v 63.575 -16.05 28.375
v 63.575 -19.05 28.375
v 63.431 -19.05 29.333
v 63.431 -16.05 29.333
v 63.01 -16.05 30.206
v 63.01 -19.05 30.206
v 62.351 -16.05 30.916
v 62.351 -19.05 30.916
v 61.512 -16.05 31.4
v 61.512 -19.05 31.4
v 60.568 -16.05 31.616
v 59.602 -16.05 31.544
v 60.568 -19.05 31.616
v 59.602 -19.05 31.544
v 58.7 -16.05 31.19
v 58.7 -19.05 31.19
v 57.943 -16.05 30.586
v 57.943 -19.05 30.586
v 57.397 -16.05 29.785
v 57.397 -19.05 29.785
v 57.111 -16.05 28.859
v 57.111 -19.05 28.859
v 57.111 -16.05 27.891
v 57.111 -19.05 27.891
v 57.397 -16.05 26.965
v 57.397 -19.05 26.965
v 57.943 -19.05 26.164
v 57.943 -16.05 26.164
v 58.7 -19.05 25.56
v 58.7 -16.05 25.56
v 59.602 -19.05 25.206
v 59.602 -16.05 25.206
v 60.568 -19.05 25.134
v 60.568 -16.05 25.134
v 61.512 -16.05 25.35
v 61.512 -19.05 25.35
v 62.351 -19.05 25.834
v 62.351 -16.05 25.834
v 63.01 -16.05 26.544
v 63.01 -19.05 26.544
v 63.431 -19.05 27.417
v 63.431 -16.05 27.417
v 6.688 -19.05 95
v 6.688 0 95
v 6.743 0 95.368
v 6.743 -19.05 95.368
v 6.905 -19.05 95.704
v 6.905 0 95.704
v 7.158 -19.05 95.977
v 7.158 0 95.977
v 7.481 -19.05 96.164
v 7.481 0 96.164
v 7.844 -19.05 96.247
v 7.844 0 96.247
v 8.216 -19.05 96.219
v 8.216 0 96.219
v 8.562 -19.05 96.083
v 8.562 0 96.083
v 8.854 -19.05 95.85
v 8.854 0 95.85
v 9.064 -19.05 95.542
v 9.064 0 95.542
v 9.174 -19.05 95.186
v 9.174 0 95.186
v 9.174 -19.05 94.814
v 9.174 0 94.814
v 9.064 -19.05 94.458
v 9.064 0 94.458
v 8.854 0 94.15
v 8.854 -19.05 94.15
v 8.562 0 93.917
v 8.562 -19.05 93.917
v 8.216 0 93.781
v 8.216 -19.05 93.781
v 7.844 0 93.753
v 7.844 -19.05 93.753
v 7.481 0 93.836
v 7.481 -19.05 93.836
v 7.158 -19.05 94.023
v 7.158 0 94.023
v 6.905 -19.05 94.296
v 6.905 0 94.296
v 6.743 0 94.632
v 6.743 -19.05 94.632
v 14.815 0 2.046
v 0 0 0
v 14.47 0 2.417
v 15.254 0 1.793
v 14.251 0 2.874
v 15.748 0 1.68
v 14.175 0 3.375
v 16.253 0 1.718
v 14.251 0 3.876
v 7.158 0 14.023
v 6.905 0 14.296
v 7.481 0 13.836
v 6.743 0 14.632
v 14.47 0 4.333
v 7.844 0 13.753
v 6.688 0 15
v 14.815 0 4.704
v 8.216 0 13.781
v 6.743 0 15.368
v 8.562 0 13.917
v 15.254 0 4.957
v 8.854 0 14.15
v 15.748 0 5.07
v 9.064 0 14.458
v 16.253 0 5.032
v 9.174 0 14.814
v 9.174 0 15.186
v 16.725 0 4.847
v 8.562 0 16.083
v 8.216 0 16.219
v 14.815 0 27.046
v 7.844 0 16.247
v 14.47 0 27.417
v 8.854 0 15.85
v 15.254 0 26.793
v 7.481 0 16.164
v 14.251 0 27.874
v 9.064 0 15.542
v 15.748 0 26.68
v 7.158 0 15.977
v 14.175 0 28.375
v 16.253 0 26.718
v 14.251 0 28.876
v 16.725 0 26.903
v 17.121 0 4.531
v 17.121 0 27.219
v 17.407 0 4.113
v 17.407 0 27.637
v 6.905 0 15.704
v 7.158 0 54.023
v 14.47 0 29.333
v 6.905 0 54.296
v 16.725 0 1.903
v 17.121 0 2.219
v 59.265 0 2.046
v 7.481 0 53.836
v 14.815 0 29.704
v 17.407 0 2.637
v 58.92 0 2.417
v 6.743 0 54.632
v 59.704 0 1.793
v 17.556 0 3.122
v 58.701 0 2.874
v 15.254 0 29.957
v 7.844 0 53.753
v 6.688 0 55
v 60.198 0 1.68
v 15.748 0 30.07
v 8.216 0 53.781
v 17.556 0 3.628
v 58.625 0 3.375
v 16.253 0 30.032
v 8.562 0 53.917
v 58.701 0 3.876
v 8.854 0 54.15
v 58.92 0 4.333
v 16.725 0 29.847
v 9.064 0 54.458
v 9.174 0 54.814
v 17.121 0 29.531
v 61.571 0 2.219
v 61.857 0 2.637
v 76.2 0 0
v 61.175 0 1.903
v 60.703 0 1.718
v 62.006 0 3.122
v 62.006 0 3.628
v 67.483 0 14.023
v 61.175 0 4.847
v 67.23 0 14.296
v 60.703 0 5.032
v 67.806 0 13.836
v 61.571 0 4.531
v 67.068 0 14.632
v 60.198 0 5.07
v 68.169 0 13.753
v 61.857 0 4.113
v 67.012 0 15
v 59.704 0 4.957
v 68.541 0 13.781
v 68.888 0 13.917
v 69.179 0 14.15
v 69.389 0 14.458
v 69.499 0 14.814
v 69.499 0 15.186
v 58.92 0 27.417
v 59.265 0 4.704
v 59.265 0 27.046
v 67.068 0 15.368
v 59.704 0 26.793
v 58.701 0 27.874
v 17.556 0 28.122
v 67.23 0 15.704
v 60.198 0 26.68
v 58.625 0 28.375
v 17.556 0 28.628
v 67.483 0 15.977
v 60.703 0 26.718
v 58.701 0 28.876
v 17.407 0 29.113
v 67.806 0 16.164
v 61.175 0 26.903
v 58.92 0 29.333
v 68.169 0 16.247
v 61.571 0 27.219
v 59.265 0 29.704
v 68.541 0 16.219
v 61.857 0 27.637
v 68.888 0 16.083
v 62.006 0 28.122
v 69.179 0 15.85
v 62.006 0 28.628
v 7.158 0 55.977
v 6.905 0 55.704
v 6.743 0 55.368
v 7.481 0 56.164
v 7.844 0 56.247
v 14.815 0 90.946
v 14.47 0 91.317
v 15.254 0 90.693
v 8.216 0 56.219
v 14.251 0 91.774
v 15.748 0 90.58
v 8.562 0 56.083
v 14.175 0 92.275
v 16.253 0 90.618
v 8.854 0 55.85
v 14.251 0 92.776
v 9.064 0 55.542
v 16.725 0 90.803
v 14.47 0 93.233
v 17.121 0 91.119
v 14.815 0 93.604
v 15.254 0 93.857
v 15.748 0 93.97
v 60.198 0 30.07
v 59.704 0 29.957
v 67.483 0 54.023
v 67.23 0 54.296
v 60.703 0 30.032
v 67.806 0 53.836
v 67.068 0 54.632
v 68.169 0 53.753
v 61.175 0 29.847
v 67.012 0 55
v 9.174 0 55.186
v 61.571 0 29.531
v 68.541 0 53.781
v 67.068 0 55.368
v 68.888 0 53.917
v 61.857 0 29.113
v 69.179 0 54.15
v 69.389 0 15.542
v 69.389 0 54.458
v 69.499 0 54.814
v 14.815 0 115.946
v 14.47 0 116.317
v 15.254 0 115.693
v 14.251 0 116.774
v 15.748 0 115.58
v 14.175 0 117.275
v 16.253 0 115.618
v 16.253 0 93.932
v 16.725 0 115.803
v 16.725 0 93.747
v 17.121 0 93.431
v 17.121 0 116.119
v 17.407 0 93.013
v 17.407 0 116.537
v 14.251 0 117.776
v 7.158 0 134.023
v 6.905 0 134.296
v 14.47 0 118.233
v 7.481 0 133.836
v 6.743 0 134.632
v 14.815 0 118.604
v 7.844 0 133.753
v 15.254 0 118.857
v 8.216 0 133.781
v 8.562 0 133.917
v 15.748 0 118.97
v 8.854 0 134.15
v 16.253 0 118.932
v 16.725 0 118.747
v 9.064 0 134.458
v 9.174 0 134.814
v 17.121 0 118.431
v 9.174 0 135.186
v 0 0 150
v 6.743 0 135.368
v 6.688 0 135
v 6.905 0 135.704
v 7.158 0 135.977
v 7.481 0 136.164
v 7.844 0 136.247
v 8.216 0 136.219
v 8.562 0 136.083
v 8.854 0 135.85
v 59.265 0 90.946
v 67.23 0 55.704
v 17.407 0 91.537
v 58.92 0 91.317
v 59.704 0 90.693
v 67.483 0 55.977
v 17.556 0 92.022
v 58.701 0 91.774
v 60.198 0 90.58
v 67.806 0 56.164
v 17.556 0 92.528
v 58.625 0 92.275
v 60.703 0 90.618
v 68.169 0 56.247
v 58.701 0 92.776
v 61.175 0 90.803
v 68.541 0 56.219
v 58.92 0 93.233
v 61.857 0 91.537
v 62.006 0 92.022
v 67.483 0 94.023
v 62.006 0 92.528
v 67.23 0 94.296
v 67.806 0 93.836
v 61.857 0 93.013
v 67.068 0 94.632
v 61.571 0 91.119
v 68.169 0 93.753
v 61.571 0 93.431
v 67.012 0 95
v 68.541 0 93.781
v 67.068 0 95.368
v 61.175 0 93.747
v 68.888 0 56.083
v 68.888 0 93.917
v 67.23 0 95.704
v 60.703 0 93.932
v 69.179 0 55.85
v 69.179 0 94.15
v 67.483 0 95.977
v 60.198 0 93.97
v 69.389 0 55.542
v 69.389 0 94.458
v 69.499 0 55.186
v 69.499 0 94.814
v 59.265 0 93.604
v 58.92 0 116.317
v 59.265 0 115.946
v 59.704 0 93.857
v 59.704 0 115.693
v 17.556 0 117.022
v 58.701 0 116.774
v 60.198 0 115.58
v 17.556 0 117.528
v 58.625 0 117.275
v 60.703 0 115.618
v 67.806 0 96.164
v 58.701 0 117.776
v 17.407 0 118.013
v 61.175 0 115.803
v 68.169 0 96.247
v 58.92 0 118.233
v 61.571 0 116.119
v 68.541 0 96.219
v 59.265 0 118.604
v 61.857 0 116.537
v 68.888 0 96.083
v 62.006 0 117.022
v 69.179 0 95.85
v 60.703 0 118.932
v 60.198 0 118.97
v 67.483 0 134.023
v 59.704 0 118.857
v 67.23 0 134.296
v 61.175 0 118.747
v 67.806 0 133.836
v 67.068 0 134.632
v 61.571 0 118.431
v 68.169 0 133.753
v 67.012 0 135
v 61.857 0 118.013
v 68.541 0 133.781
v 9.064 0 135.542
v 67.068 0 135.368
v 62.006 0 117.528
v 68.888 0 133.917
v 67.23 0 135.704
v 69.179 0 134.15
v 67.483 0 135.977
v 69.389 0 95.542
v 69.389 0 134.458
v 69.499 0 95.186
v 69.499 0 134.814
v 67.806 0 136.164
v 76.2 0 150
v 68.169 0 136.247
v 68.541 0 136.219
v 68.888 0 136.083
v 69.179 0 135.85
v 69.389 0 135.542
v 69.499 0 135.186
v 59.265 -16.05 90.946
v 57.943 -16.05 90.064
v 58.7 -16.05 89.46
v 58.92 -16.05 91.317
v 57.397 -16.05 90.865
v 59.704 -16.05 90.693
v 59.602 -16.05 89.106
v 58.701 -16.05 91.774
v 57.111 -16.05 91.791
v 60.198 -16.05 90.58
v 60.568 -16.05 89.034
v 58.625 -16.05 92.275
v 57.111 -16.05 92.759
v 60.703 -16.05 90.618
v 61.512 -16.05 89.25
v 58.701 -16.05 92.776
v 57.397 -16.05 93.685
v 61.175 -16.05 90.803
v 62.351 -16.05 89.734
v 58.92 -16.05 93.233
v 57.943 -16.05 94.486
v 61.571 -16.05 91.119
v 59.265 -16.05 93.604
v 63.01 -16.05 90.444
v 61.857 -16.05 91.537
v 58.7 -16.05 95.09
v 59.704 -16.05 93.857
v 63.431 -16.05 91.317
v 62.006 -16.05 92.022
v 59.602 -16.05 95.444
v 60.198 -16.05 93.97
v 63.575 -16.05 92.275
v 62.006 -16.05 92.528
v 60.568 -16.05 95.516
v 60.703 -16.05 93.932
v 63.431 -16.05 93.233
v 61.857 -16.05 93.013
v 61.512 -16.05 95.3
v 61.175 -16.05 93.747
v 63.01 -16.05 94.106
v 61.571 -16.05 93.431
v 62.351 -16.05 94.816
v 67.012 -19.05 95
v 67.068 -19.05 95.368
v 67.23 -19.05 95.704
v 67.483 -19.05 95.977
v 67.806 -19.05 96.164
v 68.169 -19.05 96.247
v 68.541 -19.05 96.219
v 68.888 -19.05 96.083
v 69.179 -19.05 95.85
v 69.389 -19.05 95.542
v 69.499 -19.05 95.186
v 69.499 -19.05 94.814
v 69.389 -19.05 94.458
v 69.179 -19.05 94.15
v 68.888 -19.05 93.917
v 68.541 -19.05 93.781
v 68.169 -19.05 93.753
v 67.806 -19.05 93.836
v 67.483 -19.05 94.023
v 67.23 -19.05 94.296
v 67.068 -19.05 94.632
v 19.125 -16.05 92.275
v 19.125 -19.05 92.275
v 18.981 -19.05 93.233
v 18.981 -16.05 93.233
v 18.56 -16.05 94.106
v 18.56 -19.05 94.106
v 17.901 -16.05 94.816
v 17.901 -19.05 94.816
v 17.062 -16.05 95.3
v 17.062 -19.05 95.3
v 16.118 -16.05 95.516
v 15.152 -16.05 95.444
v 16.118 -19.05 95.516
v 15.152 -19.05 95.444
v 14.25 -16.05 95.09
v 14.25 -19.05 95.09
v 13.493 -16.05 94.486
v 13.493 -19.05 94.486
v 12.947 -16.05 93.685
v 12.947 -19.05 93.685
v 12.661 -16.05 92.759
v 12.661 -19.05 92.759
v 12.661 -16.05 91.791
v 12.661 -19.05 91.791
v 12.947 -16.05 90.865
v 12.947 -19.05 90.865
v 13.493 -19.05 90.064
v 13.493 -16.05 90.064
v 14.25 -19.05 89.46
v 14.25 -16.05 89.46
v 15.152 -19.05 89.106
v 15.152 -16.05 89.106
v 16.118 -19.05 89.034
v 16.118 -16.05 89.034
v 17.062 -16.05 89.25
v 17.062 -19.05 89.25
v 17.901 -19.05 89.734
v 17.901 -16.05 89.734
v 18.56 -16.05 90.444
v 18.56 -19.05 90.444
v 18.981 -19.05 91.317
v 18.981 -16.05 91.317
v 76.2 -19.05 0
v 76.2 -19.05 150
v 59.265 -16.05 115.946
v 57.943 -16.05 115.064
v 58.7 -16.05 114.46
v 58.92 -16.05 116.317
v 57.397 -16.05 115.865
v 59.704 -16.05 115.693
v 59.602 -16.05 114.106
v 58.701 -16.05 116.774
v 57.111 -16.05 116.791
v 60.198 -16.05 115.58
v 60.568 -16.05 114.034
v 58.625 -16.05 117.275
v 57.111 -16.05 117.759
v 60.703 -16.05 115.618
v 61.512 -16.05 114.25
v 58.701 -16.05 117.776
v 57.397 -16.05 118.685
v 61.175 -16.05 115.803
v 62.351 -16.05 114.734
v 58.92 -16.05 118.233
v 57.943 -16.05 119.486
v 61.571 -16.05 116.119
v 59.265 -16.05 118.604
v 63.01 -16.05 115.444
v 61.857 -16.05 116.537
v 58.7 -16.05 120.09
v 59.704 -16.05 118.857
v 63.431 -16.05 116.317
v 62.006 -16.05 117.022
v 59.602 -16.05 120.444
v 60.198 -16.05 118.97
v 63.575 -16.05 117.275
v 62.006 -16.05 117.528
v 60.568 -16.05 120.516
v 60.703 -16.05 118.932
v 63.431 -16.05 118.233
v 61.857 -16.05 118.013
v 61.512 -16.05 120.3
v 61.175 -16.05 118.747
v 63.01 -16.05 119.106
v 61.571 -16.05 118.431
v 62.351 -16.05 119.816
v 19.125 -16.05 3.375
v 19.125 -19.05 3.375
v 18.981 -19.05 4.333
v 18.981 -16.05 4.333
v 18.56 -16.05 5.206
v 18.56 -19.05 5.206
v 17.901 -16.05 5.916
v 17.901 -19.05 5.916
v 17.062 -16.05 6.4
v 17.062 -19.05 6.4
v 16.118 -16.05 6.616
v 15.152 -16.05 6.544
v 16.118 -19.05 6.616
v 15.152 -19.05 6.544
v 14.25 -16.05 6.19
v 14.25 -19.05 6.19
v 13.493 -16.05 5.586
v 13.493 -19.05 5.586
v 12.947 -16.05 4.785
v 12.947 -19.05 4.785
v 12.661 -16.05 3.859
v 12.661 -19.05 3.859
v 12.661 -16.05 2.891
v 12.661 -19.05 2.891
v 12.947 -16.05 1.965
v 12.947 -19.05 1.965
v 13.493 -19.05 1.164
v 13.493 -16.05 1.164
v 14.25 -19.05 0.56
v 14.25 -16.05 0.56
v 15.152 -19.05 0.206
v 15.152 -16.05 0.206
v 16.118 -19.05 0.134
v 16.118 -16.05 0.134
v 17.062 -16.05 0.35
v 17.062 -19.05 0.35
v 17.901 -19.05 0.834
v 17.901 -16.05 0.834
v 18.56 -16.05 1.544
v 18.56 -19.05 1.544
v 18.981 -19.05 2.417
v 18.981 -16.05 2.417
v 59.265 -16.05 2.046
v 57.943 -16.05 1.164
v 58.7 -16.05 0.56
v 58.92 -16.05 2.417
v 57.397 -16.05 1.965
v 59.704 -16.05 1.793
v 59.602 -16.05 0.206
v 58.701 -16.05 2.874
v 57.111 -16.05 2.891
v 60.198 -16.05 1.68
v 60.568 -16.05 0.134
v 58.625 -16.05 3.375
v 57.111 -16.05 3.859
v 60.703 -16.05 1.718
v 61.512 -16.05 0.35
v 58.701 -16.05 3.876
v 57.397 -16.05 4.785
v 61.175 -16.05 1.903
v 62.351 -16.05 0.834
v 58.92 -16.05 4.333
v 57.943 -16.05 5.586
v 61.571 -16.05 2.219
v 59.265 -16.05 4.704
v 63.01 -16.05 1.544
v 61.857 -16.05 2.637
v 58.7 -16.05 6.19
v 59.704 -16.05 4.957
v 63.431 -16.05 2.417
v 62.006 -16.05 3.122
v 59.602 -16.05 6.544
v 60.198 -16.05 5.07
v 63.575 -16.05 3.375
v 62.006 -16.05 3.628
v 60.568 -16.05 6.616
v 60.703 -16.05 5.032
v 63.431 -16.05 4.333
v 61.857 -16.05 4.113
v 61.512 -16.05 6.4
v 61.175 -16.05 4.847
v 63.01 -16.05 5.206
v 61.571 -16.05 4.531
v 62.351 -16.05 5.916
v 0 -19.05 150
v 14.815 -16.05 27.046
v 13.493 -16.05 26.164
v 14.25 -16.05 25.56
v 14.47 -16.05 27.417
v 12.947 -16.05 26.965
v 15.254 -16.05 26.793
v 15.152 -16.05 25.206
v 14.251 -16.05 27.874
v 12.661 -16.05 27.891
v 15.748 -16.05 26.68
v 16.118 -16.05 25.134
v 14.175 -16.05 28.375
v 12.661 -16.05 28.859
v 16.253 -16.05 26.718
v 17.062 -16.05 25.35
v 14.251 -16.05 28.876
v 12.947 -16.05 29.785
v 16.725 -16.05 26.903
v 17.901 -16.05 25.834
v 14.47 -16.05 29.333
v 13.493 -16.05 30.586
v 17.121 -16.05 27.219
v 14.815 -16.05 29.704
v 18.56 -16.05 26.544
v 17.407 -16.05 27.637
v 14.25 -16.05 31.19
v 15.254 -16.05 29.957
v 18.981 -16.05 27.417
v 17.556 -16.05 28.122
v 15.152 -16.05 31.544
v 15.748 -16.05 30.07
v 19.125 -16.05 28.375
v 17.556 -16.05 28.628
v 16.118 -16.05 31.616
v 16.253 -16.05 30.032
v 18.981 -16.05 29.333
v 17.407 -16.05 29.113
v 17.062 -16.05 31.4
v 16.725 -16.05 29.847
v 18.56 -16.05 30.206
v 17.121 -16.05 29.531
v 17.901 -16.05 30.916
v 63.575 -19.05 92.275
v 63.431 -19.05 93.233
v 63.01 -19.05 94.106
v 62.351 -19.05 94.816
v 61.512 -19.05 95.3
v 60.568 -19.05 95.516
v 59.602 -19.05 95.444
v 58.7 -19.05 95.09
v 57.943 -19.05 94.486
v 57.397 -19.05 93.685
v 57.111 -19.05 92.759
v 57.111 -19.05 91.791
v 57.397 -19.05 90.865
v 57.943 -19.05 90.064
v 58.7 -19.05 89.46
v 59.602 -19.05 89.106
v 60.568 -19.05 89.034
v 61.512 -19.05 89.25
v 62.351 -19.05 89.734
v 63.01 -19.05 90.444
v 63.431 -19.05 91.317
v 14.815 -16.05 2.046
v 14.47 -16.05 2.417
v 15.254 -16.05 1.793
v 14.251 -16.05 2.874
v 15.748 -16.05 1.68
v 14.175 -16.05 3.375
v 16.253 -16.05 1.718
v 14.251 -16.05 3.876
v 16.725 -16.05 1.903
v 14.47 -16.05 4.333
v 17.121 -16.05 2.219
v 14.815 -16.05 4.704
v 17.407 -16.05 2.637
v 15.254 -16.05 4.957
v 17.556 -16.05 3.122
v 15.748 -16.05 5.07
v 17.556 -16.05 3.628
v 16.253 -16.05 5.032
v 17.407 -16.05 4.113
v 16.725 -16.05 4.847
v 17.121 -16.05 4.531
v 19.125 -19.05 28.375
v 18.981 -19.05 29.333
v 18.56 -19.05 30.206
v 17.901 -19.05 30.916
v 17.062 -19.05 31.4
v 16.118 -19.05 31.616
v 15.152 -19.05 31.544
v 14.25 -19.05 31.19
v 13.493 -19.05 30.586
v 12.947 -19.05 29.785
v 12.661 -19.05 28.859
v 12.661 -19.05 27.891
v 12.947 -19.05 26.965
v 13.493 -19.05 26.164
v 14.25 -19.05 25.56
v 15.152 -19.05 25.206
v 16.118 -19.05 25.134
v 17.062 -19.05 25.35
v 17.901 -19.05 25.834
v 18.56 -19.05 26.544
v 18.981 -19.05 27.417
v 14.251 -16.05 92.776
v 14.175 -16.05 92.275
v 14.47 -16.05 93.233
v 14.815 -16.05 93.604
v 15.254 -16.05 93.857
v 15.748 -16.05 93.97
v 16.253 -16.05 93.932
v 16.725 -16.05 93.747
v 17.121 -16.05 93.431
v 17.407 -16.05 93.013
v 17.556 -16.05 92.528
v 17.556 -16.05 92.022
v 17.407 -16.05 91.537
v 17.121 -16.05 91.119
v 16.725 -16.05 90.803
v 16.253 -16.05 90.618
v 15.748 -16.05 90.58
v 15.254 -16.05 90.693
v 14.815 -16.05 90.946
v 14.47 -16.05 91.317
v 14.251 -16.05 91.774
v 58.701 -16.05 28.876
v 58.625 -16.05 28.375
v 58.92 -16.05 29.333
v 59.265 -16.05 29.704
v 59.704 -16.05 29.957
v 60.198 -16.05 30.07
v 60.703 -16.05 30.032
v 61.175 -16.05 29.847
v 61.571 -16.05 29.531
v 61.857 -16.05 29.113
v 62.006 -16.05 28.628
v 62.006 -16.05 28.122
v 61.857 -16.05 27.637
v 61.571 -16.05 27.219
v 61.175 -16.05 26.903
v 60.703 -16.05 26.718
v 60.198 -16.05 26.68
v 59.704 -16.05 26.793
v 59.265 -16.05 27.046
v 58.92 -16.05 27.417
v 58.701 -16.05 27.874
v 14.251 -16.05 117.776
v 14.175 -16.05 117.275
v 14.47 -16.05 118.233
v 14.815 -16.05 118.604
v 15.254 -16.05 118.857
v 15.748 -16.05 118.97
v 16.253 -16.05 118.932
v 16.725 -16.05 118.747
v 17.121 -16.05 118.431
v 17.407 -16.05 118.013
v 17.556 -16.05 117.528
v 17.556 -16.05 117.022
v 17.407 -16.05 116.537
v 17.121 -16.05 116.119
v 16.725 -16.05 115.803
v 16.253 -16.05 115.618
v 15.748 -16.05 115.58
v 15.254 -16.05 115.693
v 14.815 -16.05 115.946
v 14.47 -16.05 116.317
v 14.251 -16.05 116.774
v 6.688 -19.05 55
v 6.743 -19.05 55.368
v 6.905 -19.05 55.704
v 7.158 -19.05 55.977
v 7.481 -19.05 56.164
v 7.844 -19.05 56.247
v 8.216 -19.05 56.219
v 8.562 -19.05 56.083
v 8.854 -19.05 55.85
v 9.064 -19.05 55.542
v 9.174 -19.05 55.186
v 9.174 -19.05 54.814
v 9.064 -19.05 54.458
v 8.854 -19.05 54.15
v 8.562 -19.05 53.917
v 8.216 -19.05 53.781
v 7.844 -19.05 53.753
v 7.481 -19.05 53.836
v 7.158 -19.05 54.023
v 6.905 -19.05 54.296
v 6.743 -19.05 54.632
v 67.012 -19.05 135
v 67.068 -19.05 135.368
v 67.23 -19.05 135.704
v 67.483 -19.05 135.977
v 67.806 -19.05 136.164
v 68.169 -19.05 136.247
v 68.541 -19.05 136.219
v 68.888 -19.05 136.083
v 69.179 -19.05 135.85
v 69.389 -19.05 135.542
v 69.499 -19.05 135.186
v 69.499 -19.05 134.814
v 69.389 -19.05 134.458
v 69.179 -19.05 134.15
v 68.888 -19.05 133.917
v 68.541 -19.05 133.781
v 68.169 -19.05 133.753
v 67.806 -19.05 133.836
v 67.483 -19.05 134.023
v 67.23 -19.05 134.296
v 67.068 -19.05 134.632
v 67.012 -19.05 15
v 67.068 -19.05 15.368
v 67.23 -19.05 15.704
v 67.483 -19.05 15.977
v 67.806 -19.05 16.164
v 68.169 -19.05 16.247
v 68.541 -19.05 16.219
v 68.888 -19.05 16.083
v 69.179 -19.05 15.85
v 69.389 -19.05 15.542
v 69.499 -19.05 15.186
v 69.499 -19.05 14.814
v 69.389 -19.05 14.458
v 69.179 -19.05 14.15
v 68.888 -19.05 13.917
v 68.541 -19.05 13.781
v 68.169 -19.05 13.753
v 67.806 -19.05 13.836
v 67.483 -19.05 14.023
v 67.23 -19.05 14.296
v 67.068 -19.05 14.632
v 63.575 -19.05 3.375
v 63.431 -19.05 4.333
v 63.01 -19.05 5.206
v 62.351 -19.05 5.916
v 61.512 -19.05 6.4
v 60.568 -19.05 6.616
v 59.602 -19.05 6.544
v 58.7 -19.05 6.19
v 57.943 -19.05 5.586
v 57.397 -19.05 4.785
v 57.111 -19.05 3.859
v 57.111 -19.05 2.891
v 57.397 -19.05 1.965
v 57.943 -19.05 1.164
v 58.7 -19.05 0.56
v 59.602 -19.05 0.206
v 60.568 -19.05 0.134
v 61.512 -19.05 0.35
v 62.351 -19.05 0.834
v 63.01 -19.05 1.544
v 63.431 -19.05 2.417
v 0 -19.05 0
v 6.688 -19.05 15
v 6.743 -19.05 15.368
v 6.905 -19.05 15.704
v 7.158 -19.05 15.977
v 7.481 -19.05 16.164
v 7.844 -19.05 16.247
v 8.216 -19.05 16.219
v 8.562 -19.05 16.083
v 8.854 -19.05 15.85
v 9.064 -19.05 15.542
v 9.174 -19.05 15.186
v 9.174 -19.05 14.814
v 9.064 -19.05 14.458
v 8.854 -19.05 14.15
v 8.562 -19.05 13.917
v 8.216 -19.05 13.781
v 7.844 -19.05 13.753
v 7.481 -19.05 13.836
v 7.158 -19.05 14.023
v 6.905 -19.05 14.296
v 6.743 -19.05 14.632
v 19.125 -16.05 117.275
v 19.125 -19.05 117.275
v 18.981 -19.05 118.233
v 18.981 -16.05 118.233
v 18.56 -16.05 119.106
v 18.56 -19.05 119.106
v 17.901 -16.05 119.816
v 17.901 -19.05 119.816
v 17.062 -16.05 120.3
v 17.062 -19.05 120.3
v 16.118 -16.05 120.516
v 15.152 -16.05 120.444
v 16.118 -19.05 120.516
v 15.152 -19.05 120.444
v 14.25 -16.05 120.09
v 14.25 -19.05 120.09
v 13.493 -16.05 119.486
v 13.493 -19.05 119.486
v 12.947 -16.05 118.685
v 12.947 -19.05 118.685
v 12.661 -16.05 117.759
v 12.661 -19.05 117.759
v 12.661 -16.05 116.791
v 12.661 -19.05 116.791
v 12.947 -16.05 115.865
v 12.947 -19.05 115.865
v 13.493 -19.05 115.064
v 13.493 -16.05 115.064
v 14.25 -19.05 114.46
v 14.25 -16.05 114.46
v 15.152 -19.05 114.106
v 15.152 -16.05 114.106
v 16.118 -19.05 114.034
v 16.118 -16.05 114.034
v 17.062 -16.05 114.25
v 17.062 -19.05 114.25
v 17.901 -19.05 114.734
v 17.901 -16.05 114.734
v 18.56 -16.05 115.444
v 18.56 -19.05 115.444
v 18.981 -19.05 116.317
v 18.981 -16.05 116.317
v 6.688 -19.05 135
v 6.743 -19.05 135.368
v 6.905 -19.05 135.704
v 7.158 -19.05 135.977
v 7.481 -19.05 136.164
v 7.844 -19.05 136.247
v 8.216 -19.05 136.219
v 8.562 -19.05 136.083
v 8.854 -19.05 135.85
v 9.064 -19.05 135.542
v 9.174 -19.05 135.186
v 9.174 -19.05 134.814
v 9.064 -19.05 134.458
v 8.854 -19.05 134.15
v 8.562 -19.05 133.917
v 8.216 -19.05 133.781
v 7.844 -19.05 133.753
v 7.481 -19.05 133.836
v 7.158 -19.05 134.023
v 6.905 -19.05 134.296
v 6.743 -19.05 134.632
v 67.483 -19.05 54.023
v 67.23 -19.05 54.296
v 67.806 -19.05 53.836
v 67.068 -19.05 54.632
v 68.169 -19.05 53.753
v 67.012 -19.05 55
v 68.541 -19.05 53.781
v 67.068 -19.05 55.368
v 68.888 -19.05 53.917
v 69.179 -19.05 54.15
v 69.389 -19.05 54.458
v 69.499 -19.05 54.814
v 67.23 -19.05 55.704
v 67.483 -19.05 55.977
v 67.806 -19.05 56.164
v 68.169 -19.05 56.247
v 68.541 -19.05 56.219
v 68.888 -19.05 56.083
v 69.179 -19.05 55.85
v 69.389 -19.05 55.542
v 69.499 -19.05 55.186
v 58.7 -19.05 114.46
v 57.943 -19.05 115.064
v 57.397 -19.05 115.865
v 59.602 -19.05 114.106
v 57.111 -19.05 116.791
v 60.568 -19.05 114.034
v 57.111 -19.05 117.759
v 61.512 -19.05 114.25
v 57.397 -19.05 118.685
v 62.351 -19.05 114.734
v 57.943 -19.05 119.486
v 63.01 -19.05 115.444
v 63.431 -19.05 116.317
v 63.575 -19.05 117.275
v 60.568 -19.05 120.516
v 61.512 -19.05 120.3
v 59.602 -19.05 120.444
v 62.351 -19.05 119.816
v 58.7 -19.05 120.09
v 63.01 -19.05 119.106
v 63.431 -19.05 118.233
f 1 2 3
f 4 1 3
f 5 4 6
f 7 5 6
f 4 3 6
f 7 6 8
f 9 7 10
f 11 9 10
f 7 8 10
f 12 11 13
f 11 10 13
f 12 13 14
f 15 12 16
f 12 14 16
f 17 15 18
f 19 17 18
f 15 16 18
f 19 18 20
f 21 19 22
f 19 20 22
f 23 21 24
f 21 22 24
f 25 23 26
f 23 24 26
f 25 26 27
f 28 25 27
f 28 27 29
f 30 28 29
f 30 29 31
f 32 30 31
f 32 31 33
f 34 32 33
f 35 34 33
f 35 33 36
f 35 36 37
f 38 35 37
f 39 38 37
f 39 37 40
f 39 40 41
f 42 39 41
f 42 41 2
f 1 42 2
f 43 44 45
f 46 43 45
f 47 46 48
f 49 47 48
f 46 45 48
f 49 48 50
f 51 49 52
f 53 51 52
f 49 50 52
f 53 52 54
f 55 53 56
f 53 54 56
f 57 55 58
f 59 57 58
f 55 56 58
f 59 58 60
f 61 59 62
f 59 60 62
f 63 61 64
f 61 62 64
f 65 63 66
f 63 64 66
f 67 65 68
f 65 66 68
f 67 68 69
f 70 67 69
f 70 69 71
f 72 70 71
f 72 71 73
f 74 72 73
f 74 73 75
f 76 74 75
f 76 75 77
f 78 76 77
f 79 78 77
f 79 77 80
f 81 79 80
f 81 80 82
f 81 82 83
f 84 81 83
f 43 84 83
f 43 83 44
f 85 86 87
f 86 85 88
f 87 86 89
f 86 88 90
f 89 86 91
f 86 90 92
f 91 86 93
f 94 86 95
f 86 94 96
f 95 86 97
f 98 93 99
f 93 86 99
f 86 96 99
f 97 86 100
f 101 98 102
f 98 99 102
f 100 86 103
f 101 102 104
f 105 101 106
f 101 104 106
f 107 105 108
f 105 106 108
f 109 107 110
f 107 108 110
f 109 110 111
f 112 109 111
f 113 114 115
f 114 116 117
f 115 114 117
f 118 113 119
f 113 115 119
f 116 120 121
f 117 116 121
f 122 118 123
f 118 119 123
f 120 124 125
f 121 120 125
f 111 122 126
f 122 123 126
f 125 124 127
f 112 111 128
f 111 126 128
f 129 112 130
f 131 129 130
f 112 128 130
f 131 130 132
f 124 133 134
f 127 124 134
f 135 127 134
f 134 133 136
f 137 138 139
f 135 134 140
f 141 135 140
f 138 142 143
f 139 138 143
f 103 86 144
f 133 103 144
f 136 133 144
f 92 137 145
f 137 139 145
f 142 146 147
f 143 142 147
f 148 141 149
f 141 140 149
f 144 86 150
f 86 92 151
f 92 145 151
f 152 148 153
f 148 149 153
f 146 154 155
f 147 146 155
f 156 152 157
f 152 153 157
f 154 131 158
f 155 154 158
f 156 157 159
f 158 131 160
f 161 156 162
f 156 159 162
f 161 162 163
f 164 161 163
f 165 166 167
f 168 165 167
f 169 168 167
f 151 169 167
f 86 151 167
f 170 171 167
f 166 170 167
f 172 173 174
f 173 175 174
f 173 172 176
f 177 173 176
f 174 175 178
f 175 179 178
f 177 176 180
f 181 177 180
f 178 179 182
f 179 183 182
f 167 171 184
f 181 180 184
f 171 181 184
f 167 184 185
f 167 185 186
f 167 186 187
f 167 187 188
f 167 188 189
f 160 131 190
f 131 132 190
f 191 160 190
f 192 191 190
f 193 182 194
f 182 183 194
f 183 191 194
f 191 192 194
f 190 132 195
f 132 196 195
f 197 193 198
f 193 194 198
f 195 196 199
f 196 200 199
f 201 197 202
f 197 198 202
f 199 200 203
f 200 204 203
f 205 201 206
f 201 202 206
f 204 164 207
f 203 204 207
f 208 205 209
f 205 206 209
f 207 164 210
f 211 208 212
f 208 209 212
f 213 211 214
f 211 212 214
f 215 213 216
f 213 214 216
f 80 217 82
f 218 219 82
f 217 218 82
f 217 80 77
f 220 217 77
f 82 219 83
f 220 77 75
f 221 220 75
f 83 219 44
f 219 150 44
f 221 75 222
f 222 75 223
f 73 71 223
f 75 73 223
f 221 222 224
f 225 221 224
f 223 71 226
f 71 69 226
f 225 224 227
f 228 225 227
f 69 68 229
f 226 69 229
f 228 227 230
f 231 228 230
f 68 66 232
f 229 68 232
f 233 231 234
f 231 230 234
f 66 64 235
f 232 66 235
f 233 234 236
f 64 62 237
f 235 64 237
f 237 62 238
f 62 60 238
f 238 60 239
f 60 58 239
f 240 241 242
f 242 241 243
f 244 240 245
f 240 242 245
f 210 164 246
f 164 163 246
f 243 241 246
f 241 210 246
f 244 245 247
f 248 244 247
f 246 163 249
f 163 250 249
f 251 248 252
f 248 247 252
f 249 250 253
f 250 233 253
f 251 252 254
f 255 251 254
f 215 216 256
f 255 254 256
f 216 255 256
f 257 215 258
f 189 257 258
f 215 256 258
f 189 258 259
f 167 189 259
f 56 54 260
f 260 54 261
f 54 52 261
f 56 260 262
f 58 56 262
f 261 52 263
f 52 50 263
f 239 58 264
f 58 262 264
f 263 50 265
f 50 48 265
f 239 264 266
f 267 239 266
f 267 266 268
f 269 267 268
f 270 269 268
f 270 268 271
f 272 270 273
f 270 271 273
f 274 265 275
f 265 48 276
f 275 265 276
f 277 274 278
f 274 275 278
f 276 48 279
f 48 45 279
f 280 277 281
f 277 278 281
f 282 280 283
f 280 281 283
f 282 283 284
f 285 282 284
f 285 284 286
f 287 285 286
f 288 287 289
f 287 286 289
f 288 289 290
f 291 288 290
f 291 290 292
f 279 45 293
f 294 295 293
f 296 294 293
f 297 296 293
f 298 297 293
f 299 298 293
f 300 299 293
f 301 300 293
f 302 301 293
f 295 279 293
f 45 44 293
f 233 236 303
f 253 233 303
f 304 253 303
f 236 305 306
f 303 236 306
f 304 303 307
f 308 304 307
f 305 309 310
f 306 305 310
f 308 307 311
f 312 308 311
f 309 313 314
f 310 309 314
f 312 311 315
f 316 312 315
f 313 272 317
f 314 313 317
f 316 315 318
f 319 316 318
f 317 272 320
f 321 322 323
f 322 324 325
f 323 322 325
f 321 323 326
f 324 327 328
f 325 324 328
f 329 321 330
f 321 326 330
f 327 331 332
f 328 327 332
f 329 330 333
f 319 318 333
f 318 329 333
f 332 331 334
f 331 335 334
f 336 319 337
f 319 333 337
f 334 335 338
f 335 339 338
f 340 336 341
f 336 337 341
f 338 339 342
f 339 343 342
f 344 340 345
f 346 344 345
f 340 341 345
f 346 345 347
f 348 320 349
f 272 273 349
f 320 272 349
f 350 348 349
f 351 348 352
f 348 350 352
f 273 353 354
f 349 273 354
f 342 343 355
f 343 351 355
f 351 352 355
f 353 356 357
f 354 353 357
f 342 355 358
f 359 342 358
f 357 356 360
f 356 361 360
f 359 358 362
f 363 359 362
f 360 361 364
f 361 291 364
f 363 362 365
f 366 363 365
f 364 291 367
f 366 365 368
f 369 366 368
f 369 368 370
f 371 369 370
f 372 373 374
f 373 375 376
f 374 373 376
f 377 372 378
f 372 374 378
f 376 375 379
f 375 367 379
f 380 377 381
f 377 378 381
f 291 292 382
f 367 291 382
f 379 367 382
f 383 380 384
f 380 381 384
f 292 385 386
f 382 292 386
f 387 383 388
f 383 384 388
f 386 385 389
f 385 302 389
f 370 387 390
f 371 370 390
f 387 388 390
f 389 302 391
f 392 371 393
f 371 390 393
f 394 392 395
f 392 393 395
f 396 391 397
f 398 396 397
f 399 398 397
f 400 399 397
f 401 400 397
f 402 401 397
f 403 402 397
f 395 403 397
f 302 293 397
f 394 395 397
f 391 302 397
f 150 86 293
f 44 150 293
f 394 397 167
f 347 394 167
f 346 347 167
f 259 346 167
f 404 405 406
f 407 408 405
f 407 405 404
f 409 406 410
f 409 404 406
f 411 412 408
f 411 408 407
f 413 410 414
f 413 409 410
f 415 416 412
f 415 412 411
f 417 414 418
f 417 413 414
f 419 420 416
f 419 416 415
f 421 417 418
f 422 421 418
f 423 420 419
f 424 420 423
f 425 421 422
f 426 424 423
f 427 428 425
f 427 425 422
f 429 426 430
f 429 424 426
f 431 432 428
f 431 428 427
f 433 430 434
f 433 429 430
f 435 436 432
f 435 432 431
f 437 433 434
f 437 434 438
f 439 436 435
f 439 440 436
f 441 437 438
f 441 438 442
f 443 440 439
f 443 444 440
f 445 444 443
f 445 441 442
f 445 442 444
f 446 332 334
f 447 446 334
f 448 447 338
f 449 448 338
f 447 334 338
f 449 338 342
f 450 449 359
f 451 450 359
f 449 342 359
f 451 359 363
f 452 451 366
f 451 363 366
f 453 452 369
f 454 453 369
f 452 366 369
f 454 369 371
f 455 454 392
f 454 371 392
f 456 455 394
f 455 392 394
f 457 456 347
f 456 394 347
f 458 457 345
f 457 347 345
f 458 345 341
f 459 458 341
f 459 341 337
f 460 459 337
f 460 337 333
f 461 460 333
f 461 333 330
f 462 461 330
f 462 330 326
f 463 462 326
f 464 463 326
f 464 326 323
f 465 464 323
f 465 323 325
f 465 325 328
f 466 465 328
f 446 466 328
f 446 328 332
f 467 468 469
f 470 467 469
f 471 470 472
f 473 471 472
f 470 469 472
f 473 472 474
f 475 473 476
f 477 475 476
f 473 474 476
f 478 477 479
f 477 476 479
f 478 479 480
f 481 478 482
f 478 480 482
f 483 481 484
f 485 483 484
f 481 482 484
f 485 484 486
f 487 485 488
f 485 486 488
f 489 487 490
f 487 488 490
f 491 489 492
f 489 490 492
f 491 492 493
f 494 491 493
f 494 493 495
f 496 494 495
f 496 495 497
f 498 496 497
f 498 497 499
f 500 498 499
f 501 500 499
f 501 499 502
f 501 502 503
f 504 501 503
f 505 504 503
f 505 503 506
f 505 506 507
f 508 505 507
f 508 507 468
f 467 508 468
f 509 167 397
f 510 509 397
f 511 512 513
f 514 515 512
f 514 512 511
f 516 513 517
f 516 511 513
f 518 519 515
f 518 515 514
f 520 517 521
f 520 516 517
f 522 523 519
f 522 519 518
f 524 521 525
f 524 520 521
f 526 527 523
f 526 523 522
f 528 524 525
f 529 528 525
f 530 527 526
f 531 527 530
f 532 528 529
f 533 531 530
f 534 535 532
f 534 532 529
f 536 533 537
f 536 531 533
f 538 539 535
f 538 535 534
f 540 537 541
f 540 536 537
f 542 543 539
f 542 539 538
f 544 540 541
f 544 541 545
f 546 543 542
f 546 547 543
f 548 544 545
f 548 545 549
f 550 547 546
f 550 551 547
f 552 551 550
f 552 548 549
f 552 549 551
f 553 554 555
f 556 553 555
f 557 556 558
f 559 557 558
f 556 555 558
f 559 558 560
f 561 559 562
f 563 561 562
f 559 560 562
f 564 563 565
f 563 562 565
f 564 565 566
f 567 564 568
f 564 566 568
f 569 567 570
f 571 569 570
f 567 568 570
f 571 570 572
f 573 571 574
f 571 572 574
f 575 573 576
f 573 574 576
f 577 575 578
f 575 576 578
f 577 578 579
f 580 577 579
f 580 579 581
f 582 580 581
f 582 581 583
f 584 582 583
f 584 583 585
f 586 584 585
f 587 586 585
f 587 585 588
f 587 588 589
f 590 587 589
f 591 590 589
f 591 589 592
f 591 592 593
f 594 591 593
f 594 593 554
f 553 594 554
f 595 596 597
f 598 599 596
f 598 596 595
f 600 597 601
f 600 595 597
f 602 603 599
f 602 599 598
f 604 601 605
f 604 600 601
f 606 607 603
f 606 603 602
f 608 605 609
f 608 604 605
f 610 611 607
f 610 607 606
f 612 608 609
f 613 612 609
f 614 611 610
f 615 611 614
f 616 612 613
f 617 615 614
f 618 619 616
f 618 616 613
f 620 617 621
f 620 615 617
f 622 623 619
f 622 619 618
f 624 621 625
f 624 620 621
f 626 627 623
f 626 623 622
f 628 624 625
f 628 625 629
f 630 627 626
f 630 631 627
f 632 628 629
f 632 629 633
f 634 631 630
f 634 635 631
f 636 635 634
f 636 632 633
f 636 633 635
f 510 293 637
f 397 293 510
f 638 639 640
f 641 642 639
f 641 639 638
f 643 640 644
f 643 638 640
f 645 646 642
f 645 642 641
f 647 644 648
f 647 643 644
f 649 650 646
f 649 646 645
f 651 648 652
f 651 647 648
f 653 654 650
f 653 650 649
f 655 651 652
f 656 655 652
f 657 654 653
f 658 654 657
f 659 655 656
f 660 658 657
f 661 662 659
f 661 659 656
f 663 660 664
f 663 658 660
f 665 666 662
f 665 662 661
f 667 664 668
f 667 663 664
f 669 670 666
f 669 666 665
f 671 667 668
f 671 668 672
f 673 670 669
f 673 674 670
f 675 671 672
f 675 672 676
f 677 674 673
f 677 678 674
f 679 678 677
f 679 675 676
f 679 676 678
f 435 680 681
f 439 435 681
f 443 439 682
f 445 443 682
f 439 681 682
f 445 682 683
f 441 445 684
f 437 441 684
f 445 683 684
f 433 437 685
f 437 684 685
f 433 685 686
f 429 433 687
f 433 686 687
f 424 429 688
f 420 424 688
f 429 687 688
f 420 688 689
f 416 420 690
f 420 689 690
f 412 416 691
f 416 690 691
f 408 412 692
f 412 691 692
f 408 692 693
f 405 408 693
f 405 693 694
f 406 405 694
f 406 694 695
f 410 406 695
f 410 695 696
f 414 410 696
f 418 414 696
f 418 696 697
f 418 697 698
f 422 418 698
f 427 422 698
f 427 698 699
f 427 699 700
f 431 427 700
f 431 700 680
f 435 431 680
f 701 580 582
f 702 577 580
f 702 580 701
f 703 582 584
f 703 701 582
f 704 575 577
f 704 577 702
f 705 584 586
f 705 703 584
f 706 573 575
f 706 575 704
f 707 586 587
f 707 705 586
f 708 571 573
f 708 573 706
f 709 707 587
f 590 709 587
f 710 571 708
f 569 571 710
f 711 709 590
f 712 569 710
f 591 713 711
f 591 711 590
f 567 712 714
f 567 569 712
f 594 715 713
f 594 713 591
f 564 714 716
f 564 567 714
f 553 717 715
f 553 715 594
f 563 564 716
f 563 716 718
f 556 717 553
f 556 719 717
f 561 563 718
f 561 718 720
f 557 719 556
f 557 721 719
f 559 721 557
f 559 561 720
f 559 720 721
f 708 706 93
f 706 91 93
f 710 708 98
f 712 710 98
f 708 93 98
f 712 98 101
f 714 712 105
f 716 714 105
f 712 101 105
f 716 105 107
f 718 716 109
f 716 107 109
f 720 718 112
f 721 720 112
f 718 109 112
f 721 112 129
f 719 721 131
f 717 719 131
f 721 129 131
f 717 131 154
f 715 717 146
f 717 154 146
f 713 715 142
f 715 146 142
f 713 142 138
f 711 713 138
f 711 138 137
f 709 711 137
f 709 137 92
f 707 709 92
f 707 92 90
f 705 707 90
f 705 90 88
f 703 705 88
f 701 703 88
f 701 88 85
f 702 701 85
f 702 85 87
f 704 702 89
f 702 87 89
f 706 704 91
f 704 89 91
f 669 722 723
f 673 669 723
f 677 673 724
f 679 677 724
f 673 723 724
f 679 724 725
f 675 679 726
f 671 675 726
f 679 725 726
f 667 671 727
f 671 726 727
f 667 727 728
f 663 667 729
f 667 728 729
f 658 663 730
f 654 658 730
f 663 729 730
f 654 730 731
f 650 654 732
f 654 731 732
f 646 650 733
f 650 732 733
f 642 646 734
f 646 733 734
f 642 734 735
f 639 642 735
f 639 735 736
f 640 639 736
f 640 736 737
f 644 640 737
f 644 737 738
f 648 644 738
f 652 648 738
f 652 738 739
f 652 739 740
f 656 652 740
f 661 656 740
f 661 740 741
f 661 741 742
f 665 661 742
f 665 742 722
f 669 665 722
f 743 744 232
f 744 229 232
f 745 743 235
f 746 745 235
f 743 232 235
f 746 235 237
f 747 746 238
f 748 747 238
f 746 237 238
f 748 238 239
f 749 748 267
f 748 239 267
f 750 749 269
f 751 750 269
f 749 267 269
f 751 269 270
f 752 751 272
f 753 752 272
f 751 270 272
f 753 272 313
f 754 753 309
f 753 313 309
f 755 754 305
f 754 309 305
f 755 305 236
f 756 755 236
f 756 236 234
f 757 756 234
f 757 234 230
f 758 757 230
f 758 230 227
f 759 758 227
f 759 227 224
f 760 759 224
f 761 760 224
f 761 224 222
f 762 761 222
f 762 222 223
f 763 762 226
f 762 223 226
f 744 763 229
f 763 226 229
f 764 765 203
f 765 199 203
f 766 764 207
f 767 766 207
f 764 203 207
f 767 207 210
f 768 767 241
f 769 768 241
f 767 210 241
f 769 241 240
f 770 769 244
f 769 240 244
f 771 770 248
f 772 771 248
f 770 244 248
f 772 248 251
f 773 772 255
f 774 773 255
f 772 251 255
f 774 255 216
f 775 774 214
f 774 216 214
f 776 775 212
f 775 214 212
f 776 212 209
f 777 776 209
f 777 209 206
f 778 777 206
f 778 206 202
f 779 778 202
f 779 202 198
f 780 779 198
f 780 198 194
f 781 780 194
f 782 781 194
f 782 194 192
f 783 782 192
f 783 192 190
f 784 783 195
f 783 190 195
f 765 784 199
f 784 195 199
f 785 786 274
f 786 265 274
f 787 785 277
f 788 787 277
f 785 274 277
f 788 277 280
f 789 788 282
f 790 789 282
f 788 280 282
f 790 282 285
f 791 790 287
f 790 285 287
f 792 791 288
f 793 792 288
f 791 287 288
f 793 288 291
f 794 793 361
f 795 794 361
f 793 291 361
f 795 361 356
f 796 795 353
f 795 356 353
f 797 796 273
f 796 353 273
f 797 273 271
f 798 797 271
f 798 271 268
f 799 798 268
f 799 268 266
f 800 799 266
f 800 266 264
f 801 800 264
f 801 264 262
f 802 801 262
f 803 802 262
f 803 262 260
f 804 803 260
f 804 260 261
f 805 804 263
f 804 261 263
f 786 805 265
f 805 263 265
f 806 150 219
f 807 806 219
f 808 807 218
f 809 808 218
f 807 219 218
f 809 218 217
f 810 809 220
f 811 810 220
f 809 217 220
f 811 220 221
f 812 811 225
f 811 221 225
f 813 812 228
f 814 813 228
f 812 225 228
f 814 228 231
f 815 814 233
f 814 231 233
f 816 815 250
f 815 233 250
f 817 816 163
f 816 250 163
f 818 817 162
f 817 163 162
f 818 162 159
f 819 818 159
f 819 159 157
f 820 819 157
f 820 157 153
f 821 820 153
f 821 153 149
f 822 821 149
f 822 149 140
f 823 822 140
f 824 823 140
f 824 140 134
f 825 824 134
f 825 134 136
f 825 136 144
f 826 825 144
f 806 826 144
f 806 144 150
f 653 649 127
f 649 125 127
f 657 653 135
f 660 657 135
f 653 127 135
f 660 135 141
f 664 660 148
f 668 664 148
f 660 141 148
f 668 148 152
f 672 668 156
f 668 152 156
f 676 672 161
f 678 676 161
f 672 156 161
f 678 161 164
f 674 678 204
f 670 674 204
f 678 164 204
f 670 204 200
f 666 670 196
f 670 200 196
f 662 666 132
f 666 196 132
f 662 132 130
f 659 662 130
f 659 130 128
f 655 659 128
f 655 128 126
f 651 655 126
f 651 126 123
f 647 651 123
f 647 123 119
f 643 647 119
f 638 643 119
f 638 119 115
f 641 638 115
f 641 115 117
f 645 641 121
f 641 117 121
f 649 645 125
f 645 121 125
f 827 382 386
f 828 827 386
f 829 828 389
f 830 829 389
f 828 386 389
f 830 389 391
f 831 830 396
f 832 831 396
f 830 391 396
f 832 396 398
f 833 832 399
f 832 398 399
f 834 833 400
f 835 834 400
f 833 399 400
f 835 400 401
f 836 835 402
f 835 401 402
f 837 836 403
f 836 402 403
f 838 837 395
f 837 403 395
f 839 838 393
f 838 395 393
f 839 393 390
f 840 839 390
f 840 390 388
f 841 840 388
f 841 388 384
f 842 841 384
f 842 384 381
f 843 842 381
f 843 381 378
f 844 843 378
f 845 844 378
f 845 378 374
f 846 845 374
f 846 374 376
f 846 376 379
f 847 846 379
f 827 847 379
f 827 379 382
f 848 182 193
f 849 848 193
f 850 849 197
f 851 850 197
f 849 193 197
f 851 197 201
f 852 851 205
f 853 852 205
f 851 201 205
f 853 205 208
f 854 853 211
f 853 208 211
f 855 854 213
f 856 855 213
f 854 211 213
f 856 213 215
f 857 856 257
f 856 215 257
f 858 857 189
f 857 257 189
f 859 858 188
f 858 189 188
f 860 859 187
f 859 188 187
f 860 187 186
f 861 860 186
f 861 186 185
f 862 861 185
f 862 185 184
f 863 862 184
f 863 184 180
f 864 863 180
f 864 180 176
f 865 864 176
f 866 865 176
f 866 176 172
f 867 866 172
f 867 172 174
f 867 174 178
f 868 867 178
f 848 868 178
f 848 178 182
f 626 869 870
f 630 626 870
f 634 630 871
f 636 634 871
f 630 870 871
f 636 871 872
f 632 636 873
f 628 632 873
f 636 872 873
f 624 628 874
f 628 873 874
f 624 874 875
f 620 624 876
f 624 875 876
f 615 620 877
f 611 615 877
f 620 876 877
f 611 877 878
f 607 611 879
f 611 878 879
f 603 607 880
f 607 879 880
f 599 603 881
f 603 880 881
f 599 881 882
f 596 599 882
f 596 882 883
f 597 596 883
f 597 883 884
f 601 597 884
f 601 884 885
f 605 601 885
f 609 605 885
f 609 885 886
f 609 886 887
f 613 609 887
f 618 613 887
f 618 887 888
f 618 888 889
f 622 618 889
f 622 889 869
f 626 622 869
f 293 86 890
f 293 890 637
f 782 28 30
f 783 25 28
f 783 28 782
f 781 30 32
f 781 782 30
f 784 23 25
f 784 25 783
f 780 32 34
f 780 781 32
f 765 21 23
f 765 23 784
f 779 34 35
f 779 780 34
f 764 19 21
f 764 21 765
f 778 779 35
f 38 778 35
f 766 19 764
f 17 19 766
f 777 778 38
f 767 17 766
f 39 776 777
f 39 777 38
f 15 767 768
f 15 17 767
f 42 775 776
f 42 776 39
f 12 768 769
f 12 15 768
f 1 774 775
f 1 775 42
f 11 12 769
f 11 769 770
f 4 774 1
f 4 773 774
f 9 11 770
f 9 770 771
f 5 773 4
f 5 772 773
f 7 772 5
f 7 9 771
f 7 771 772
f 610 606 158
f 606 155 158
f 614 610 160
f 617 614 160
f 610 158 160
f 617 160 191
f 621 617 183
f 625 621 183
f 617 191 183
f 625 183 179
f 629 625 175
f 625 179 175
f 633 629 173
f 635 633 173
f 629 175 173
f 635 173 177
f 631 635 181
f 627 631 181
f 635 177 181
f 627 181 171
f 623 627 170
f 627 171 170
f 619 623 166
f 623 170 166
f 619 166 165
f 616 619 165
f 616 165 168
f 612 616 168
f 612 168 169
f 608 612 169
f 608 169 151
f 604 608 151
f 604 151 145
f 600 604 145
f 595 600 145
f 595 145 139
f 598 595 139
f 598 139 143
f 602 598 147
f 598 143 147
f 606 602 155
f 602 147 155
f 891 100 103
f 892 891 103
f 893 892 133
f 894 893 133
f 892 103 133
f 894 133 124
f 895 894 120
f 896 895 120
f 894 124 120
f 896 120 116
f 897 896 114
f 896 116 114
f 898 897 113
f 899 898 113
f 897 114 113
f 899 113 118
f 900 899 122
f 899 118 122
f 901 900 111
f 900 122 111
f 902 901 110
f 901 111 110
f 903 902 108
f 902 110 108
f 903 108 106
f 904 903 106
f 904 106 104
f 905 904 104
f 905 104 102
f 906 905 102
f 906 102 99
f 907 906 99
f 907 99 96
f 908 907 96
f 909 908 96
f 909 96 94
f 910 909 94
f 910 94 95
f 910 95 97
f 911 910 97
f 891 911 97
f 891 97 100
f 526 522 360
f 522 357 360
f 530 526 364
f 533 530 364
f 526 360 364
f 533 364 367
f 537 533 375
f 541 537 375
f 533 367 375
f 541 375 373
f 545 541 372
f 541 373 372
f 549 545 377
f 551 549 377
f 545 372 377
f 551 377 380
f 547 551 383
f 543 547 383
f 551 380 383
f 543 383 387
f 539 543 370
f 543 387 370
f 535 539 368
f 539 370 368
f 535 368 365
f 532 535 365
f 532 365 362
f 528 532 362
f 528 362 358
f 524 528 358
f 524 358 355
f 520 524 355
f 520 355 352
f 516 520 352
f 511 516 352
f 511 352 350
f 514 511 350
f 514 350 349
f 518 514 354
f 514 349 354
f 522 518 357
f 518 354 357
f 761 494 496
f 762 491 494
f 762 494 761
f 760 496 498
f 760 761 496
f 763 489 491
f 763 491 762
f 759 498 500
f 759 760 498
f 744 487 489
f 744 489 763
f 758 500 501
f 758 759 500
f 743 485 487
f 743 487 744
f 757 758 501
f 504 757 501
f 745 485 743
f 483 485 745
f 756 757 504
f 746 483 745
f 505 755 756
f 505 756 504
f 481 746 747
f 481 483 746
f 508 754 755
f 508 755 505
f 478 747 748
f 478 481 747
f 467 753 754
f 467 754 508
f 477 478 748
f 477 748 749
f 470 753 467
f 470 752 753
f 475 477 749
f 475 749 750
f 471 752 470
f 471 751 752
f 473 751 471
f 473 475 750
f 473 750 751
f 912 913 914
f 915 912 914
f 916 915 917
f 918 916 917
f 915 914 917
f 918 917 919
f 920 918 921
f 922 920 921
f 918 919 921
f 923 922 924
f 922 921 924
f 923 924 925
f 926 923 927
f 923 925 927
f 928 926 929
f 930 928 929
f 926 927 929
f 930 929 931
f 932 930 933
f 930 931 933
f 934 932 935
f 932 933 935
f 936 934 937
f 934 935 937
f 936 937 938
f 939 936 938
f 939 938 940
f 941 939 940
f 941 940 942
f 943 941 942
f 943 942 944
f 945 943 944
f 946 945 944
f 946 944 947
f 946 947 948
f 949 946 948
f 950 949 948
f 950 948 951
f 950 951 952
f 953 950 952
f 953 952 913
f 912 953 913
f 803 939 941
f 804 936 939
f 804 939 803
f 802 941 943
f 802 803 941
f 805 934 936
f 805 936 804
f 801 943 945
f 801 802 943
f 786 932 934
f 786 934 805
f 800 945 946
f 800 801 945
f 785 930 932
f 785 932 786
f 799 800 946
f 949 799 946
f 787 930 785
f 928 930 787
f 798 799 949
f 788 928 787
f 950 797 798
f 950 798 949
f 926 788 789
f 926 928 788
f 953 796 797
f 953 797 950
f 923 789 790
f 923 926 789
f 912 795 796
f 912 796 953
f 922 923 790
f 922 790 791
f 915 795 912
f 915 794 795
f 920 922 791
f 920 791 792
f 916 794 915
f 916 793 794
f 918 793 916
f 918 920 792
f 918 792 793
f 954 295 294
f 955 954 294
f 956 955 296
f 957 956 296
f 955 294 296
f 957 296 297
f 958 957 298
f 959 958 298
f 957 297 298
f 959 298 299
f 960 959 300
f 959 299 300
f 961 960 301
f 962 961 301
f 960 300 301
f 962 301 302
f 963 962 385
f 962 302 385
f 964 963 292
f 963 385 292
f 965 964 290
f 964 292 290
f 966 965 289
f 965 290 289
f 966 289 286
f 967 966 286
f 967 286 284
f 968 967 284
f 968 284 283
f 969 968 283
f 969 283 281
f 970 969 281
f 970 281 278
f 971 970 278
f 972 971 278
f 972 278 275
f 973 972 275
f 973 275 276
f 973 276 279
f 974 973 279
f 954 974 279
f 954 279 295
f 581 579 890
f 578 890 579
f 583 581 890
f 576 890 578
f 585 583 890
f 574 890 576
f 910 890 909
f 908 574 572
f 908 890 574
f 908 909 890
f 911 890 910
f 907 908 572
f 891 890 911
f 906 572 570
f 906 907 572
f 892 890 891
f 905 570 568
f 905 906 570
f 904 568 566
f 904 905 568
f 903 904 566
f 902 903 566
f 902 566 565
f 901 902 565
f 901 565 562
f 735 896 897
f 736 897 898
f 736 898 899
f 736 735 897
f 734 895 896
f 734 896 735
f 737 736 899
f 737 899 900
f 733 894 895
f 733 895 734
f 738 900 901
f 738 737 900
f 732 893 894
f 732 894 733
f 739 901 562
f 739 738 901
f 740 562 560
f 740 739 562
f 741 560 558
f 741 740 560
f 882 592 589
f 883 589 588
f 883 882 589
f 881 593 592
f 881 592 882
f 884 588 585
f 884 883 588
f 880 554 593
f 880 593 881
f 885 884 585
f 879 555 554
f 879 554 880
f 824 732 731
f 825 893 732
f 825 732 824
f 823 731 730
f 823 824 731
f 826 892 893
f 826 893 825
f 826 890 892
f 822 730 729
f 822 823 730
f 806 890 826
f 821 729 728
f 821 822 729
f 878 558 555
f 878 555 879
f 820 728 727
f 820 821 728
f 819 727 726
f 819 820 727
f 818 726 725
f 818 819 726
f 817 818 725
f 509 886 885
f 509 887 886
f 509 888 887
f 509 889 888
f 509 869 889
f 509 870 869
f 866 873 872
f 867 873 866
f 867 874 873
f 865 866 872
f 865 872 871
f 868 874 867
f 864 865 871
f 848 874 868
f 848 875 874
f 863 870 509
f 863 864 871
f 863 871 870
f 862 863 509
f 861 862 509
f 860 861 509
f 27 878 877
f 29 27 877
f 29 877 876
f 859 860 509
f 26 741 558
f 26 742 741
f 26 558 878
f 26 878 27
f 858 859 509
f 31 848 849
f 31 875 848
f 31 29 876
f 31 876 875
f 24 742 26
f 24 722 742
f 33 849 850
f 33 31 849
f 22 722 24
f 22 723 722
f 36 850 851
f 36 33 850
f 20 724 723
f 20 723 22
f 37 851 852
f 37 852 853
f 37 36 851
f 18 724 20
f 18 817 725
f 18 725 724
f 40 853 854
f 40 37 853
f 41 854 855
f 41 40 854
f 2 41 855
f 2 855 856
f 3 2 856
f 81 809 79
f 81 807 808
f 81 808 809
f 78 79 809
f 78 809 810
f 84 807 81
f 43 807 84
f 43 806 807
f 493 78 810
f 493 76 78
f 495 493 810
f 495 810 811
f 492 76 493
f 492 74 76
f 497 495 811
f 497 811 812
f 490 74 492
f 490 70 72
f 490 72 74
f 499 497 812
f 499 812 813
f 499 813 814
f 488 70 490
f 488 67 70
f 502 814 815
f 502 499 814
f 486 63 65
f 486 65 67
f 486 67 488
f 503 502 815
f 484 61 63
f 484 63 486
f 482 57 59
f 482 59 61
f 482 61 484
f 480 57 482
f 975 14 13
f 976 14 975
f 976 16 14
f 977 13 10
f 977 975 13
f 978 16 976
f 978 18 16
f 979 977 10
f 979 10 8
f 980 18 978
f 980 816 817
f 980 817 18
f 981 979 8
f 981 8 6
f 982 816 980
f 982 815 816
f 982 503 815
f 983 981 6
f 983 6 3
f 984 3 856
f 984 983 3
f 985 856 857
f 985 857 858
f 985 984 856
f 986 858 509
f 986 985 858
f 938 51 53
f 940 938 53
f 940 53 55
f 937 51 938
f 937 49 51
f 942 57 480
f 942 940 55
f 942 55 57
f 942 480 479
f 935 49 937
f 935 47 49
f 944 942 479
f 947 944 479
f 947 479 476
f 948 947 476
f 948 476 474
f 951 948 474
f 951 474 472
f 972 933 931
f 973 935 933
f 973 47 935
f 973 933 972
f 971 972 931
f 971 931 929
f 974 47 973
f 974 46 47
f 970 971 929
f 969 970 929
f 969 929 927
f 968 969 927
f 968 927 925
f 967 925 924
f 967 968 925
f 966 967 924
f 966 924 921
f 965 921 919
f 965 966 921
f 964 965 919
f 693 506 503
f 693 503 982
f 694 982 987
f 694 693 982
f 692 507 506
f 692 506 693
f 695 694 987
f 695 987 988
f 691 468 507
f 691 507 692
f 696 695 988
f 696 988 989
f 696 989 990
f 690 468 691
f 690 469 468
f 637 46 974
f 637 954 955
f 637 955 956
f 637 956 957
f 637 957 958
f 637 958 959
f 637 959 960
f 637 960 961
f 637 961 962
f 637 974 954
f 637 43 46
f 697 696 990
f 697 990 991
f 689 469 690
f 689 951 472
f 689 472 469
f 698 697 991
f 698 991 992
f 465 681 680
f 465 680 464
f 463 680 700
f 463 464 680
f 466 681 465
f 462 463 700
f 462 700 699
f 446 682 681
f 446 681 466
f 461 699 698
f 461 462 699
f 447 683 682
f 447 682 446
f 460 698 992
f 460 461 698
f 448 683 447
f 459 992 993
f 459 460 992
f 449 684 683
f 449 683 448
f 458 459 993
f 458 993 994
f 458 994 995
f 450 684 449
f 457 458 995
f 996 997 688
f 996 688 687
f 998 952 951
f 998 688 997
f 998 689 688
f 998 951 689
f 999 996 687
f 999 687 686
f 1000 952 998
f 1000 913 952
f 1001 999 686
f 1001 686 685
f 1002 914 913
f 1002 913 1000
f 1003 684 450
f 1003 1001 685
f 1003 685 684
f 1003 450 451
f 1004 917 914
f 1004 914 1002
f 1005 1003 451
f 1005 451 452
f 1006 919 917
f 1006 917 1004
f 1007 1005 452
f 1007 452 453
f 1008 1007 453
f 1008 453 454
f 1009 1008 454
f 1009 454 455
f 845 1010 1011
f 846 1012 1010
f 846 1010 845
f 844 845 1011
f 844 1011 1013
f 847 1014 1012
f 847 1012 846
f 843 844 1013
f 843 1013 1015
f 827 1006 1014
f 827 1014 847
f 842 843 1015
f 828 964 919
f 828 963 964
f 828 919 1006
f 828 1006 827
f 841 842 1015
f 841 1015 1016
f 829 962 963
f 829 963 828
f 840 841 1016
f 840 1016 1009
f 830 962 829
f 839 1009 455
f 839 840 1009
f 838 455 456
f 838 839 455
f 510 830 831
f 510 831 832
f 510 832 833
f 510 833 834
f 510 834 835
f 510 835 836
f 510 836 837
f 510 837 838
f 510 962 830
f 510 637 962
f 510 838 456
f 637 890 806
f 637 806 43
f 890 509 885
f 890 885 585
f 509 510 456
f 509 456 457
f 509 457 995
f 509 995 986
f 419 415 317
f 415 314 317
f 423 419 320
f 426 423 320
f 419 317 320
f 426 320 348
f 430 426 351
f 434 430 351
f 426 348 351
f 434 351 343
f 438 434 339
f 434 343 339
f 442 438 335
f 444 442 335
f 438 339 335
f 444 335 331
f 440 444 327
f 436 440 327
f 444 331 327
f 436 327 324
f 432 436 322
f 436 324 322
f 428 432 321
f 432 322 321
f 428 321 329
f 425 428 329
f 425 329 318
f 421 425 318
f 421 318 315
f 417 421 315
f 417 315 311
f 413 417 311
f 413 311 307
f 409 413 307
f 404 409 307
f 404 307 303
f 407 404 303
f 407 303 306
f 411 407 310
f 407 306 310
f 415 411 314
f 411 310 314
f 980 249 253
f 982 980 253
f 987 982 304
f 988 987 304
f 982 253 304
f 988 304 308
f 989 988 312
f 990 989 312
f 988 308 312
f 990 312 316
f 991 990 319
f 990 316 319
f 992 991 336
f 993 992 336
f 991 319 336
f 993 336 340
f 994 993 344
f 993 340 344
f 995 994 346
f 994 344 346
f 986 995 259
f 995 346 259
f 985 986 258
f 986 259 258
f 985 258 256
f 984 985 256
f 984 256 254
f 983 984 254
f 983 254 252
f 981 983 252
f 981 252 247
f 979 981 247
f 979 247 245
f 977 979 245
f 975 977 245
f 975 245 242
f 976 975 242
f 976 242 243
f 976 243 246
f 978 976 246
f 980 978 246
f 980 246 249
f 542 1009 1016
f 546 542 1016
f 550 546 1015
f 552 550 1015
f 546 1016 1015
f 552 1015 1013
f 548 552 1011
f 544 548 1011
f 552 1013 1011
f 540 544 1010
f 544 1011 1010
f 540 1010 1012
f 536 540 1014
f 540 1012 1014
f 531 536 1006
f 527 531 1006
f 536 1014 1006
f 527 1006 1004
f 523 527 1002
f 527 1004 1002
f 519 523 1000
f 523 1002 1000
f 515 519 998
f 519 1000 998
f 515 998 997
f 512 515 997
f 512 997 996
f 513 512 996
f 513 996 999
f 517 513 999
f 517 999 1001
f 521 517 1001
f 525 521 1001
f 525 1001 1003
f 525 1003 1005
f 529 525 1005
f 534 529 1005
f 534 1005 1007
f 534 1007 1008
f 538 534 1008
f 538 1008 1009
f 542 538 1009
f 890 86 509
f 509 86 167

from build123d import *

# Parameters (mm, degrees)
F0_W           = 76.2
F0_H           = 150
F1_DEPTH       = 19.05
F3_D           = 3.4
F3_CBORE_D     = 6.5
F3_CBORE_DEPTH = 3
F5_D           = 2.5
F5_DEPTH       = 20.55
F5_TIP         = 0.7510757738


with BuildPart() as f1:
    # F0 (on Front) → F1 (new body)
    with BuildSketch(Plane.XZ):
        with Locations((38.1, 75)):
            Rectangle(F0_W, F0_H)
    extrude(amount=F1_DEPTH)

    # F3 (through all)
    with Locations(Plane.XZ.offset(19.05)):
        with Locations((15.875, 117.275), (15.875, 92.275), (15.875, 28.375), (15.875, 3.375), (60.325, 3.375), (60.325, 28.375), (60.325, 92.275), (60.325, 117.275)):
            CounterBoreHole(F3_D / 2, F3_CBORE_D / 2, F3_CBORE_DEPTH)

    # F5
    with Locations(Plane.XZ.offset(19.05)):
        with Locations((7.9375, 135), (7.9375, 95), (7.9375, 55), (7.9375, 15), (68.2625, 15), (68.2625, 55), (68.2625, 95), (68.2625, 135)):
            Hole(F5_D / 2, depth=F5_DEPTH)
            with Locations((0, 0, -(F5_DEPTH + F5_TIP / 2))):  # 118° drill point
                Cone(0, F5_D / 2, F5_TIP, mode=Mode.SUBTRACT)


solid = f1.part
